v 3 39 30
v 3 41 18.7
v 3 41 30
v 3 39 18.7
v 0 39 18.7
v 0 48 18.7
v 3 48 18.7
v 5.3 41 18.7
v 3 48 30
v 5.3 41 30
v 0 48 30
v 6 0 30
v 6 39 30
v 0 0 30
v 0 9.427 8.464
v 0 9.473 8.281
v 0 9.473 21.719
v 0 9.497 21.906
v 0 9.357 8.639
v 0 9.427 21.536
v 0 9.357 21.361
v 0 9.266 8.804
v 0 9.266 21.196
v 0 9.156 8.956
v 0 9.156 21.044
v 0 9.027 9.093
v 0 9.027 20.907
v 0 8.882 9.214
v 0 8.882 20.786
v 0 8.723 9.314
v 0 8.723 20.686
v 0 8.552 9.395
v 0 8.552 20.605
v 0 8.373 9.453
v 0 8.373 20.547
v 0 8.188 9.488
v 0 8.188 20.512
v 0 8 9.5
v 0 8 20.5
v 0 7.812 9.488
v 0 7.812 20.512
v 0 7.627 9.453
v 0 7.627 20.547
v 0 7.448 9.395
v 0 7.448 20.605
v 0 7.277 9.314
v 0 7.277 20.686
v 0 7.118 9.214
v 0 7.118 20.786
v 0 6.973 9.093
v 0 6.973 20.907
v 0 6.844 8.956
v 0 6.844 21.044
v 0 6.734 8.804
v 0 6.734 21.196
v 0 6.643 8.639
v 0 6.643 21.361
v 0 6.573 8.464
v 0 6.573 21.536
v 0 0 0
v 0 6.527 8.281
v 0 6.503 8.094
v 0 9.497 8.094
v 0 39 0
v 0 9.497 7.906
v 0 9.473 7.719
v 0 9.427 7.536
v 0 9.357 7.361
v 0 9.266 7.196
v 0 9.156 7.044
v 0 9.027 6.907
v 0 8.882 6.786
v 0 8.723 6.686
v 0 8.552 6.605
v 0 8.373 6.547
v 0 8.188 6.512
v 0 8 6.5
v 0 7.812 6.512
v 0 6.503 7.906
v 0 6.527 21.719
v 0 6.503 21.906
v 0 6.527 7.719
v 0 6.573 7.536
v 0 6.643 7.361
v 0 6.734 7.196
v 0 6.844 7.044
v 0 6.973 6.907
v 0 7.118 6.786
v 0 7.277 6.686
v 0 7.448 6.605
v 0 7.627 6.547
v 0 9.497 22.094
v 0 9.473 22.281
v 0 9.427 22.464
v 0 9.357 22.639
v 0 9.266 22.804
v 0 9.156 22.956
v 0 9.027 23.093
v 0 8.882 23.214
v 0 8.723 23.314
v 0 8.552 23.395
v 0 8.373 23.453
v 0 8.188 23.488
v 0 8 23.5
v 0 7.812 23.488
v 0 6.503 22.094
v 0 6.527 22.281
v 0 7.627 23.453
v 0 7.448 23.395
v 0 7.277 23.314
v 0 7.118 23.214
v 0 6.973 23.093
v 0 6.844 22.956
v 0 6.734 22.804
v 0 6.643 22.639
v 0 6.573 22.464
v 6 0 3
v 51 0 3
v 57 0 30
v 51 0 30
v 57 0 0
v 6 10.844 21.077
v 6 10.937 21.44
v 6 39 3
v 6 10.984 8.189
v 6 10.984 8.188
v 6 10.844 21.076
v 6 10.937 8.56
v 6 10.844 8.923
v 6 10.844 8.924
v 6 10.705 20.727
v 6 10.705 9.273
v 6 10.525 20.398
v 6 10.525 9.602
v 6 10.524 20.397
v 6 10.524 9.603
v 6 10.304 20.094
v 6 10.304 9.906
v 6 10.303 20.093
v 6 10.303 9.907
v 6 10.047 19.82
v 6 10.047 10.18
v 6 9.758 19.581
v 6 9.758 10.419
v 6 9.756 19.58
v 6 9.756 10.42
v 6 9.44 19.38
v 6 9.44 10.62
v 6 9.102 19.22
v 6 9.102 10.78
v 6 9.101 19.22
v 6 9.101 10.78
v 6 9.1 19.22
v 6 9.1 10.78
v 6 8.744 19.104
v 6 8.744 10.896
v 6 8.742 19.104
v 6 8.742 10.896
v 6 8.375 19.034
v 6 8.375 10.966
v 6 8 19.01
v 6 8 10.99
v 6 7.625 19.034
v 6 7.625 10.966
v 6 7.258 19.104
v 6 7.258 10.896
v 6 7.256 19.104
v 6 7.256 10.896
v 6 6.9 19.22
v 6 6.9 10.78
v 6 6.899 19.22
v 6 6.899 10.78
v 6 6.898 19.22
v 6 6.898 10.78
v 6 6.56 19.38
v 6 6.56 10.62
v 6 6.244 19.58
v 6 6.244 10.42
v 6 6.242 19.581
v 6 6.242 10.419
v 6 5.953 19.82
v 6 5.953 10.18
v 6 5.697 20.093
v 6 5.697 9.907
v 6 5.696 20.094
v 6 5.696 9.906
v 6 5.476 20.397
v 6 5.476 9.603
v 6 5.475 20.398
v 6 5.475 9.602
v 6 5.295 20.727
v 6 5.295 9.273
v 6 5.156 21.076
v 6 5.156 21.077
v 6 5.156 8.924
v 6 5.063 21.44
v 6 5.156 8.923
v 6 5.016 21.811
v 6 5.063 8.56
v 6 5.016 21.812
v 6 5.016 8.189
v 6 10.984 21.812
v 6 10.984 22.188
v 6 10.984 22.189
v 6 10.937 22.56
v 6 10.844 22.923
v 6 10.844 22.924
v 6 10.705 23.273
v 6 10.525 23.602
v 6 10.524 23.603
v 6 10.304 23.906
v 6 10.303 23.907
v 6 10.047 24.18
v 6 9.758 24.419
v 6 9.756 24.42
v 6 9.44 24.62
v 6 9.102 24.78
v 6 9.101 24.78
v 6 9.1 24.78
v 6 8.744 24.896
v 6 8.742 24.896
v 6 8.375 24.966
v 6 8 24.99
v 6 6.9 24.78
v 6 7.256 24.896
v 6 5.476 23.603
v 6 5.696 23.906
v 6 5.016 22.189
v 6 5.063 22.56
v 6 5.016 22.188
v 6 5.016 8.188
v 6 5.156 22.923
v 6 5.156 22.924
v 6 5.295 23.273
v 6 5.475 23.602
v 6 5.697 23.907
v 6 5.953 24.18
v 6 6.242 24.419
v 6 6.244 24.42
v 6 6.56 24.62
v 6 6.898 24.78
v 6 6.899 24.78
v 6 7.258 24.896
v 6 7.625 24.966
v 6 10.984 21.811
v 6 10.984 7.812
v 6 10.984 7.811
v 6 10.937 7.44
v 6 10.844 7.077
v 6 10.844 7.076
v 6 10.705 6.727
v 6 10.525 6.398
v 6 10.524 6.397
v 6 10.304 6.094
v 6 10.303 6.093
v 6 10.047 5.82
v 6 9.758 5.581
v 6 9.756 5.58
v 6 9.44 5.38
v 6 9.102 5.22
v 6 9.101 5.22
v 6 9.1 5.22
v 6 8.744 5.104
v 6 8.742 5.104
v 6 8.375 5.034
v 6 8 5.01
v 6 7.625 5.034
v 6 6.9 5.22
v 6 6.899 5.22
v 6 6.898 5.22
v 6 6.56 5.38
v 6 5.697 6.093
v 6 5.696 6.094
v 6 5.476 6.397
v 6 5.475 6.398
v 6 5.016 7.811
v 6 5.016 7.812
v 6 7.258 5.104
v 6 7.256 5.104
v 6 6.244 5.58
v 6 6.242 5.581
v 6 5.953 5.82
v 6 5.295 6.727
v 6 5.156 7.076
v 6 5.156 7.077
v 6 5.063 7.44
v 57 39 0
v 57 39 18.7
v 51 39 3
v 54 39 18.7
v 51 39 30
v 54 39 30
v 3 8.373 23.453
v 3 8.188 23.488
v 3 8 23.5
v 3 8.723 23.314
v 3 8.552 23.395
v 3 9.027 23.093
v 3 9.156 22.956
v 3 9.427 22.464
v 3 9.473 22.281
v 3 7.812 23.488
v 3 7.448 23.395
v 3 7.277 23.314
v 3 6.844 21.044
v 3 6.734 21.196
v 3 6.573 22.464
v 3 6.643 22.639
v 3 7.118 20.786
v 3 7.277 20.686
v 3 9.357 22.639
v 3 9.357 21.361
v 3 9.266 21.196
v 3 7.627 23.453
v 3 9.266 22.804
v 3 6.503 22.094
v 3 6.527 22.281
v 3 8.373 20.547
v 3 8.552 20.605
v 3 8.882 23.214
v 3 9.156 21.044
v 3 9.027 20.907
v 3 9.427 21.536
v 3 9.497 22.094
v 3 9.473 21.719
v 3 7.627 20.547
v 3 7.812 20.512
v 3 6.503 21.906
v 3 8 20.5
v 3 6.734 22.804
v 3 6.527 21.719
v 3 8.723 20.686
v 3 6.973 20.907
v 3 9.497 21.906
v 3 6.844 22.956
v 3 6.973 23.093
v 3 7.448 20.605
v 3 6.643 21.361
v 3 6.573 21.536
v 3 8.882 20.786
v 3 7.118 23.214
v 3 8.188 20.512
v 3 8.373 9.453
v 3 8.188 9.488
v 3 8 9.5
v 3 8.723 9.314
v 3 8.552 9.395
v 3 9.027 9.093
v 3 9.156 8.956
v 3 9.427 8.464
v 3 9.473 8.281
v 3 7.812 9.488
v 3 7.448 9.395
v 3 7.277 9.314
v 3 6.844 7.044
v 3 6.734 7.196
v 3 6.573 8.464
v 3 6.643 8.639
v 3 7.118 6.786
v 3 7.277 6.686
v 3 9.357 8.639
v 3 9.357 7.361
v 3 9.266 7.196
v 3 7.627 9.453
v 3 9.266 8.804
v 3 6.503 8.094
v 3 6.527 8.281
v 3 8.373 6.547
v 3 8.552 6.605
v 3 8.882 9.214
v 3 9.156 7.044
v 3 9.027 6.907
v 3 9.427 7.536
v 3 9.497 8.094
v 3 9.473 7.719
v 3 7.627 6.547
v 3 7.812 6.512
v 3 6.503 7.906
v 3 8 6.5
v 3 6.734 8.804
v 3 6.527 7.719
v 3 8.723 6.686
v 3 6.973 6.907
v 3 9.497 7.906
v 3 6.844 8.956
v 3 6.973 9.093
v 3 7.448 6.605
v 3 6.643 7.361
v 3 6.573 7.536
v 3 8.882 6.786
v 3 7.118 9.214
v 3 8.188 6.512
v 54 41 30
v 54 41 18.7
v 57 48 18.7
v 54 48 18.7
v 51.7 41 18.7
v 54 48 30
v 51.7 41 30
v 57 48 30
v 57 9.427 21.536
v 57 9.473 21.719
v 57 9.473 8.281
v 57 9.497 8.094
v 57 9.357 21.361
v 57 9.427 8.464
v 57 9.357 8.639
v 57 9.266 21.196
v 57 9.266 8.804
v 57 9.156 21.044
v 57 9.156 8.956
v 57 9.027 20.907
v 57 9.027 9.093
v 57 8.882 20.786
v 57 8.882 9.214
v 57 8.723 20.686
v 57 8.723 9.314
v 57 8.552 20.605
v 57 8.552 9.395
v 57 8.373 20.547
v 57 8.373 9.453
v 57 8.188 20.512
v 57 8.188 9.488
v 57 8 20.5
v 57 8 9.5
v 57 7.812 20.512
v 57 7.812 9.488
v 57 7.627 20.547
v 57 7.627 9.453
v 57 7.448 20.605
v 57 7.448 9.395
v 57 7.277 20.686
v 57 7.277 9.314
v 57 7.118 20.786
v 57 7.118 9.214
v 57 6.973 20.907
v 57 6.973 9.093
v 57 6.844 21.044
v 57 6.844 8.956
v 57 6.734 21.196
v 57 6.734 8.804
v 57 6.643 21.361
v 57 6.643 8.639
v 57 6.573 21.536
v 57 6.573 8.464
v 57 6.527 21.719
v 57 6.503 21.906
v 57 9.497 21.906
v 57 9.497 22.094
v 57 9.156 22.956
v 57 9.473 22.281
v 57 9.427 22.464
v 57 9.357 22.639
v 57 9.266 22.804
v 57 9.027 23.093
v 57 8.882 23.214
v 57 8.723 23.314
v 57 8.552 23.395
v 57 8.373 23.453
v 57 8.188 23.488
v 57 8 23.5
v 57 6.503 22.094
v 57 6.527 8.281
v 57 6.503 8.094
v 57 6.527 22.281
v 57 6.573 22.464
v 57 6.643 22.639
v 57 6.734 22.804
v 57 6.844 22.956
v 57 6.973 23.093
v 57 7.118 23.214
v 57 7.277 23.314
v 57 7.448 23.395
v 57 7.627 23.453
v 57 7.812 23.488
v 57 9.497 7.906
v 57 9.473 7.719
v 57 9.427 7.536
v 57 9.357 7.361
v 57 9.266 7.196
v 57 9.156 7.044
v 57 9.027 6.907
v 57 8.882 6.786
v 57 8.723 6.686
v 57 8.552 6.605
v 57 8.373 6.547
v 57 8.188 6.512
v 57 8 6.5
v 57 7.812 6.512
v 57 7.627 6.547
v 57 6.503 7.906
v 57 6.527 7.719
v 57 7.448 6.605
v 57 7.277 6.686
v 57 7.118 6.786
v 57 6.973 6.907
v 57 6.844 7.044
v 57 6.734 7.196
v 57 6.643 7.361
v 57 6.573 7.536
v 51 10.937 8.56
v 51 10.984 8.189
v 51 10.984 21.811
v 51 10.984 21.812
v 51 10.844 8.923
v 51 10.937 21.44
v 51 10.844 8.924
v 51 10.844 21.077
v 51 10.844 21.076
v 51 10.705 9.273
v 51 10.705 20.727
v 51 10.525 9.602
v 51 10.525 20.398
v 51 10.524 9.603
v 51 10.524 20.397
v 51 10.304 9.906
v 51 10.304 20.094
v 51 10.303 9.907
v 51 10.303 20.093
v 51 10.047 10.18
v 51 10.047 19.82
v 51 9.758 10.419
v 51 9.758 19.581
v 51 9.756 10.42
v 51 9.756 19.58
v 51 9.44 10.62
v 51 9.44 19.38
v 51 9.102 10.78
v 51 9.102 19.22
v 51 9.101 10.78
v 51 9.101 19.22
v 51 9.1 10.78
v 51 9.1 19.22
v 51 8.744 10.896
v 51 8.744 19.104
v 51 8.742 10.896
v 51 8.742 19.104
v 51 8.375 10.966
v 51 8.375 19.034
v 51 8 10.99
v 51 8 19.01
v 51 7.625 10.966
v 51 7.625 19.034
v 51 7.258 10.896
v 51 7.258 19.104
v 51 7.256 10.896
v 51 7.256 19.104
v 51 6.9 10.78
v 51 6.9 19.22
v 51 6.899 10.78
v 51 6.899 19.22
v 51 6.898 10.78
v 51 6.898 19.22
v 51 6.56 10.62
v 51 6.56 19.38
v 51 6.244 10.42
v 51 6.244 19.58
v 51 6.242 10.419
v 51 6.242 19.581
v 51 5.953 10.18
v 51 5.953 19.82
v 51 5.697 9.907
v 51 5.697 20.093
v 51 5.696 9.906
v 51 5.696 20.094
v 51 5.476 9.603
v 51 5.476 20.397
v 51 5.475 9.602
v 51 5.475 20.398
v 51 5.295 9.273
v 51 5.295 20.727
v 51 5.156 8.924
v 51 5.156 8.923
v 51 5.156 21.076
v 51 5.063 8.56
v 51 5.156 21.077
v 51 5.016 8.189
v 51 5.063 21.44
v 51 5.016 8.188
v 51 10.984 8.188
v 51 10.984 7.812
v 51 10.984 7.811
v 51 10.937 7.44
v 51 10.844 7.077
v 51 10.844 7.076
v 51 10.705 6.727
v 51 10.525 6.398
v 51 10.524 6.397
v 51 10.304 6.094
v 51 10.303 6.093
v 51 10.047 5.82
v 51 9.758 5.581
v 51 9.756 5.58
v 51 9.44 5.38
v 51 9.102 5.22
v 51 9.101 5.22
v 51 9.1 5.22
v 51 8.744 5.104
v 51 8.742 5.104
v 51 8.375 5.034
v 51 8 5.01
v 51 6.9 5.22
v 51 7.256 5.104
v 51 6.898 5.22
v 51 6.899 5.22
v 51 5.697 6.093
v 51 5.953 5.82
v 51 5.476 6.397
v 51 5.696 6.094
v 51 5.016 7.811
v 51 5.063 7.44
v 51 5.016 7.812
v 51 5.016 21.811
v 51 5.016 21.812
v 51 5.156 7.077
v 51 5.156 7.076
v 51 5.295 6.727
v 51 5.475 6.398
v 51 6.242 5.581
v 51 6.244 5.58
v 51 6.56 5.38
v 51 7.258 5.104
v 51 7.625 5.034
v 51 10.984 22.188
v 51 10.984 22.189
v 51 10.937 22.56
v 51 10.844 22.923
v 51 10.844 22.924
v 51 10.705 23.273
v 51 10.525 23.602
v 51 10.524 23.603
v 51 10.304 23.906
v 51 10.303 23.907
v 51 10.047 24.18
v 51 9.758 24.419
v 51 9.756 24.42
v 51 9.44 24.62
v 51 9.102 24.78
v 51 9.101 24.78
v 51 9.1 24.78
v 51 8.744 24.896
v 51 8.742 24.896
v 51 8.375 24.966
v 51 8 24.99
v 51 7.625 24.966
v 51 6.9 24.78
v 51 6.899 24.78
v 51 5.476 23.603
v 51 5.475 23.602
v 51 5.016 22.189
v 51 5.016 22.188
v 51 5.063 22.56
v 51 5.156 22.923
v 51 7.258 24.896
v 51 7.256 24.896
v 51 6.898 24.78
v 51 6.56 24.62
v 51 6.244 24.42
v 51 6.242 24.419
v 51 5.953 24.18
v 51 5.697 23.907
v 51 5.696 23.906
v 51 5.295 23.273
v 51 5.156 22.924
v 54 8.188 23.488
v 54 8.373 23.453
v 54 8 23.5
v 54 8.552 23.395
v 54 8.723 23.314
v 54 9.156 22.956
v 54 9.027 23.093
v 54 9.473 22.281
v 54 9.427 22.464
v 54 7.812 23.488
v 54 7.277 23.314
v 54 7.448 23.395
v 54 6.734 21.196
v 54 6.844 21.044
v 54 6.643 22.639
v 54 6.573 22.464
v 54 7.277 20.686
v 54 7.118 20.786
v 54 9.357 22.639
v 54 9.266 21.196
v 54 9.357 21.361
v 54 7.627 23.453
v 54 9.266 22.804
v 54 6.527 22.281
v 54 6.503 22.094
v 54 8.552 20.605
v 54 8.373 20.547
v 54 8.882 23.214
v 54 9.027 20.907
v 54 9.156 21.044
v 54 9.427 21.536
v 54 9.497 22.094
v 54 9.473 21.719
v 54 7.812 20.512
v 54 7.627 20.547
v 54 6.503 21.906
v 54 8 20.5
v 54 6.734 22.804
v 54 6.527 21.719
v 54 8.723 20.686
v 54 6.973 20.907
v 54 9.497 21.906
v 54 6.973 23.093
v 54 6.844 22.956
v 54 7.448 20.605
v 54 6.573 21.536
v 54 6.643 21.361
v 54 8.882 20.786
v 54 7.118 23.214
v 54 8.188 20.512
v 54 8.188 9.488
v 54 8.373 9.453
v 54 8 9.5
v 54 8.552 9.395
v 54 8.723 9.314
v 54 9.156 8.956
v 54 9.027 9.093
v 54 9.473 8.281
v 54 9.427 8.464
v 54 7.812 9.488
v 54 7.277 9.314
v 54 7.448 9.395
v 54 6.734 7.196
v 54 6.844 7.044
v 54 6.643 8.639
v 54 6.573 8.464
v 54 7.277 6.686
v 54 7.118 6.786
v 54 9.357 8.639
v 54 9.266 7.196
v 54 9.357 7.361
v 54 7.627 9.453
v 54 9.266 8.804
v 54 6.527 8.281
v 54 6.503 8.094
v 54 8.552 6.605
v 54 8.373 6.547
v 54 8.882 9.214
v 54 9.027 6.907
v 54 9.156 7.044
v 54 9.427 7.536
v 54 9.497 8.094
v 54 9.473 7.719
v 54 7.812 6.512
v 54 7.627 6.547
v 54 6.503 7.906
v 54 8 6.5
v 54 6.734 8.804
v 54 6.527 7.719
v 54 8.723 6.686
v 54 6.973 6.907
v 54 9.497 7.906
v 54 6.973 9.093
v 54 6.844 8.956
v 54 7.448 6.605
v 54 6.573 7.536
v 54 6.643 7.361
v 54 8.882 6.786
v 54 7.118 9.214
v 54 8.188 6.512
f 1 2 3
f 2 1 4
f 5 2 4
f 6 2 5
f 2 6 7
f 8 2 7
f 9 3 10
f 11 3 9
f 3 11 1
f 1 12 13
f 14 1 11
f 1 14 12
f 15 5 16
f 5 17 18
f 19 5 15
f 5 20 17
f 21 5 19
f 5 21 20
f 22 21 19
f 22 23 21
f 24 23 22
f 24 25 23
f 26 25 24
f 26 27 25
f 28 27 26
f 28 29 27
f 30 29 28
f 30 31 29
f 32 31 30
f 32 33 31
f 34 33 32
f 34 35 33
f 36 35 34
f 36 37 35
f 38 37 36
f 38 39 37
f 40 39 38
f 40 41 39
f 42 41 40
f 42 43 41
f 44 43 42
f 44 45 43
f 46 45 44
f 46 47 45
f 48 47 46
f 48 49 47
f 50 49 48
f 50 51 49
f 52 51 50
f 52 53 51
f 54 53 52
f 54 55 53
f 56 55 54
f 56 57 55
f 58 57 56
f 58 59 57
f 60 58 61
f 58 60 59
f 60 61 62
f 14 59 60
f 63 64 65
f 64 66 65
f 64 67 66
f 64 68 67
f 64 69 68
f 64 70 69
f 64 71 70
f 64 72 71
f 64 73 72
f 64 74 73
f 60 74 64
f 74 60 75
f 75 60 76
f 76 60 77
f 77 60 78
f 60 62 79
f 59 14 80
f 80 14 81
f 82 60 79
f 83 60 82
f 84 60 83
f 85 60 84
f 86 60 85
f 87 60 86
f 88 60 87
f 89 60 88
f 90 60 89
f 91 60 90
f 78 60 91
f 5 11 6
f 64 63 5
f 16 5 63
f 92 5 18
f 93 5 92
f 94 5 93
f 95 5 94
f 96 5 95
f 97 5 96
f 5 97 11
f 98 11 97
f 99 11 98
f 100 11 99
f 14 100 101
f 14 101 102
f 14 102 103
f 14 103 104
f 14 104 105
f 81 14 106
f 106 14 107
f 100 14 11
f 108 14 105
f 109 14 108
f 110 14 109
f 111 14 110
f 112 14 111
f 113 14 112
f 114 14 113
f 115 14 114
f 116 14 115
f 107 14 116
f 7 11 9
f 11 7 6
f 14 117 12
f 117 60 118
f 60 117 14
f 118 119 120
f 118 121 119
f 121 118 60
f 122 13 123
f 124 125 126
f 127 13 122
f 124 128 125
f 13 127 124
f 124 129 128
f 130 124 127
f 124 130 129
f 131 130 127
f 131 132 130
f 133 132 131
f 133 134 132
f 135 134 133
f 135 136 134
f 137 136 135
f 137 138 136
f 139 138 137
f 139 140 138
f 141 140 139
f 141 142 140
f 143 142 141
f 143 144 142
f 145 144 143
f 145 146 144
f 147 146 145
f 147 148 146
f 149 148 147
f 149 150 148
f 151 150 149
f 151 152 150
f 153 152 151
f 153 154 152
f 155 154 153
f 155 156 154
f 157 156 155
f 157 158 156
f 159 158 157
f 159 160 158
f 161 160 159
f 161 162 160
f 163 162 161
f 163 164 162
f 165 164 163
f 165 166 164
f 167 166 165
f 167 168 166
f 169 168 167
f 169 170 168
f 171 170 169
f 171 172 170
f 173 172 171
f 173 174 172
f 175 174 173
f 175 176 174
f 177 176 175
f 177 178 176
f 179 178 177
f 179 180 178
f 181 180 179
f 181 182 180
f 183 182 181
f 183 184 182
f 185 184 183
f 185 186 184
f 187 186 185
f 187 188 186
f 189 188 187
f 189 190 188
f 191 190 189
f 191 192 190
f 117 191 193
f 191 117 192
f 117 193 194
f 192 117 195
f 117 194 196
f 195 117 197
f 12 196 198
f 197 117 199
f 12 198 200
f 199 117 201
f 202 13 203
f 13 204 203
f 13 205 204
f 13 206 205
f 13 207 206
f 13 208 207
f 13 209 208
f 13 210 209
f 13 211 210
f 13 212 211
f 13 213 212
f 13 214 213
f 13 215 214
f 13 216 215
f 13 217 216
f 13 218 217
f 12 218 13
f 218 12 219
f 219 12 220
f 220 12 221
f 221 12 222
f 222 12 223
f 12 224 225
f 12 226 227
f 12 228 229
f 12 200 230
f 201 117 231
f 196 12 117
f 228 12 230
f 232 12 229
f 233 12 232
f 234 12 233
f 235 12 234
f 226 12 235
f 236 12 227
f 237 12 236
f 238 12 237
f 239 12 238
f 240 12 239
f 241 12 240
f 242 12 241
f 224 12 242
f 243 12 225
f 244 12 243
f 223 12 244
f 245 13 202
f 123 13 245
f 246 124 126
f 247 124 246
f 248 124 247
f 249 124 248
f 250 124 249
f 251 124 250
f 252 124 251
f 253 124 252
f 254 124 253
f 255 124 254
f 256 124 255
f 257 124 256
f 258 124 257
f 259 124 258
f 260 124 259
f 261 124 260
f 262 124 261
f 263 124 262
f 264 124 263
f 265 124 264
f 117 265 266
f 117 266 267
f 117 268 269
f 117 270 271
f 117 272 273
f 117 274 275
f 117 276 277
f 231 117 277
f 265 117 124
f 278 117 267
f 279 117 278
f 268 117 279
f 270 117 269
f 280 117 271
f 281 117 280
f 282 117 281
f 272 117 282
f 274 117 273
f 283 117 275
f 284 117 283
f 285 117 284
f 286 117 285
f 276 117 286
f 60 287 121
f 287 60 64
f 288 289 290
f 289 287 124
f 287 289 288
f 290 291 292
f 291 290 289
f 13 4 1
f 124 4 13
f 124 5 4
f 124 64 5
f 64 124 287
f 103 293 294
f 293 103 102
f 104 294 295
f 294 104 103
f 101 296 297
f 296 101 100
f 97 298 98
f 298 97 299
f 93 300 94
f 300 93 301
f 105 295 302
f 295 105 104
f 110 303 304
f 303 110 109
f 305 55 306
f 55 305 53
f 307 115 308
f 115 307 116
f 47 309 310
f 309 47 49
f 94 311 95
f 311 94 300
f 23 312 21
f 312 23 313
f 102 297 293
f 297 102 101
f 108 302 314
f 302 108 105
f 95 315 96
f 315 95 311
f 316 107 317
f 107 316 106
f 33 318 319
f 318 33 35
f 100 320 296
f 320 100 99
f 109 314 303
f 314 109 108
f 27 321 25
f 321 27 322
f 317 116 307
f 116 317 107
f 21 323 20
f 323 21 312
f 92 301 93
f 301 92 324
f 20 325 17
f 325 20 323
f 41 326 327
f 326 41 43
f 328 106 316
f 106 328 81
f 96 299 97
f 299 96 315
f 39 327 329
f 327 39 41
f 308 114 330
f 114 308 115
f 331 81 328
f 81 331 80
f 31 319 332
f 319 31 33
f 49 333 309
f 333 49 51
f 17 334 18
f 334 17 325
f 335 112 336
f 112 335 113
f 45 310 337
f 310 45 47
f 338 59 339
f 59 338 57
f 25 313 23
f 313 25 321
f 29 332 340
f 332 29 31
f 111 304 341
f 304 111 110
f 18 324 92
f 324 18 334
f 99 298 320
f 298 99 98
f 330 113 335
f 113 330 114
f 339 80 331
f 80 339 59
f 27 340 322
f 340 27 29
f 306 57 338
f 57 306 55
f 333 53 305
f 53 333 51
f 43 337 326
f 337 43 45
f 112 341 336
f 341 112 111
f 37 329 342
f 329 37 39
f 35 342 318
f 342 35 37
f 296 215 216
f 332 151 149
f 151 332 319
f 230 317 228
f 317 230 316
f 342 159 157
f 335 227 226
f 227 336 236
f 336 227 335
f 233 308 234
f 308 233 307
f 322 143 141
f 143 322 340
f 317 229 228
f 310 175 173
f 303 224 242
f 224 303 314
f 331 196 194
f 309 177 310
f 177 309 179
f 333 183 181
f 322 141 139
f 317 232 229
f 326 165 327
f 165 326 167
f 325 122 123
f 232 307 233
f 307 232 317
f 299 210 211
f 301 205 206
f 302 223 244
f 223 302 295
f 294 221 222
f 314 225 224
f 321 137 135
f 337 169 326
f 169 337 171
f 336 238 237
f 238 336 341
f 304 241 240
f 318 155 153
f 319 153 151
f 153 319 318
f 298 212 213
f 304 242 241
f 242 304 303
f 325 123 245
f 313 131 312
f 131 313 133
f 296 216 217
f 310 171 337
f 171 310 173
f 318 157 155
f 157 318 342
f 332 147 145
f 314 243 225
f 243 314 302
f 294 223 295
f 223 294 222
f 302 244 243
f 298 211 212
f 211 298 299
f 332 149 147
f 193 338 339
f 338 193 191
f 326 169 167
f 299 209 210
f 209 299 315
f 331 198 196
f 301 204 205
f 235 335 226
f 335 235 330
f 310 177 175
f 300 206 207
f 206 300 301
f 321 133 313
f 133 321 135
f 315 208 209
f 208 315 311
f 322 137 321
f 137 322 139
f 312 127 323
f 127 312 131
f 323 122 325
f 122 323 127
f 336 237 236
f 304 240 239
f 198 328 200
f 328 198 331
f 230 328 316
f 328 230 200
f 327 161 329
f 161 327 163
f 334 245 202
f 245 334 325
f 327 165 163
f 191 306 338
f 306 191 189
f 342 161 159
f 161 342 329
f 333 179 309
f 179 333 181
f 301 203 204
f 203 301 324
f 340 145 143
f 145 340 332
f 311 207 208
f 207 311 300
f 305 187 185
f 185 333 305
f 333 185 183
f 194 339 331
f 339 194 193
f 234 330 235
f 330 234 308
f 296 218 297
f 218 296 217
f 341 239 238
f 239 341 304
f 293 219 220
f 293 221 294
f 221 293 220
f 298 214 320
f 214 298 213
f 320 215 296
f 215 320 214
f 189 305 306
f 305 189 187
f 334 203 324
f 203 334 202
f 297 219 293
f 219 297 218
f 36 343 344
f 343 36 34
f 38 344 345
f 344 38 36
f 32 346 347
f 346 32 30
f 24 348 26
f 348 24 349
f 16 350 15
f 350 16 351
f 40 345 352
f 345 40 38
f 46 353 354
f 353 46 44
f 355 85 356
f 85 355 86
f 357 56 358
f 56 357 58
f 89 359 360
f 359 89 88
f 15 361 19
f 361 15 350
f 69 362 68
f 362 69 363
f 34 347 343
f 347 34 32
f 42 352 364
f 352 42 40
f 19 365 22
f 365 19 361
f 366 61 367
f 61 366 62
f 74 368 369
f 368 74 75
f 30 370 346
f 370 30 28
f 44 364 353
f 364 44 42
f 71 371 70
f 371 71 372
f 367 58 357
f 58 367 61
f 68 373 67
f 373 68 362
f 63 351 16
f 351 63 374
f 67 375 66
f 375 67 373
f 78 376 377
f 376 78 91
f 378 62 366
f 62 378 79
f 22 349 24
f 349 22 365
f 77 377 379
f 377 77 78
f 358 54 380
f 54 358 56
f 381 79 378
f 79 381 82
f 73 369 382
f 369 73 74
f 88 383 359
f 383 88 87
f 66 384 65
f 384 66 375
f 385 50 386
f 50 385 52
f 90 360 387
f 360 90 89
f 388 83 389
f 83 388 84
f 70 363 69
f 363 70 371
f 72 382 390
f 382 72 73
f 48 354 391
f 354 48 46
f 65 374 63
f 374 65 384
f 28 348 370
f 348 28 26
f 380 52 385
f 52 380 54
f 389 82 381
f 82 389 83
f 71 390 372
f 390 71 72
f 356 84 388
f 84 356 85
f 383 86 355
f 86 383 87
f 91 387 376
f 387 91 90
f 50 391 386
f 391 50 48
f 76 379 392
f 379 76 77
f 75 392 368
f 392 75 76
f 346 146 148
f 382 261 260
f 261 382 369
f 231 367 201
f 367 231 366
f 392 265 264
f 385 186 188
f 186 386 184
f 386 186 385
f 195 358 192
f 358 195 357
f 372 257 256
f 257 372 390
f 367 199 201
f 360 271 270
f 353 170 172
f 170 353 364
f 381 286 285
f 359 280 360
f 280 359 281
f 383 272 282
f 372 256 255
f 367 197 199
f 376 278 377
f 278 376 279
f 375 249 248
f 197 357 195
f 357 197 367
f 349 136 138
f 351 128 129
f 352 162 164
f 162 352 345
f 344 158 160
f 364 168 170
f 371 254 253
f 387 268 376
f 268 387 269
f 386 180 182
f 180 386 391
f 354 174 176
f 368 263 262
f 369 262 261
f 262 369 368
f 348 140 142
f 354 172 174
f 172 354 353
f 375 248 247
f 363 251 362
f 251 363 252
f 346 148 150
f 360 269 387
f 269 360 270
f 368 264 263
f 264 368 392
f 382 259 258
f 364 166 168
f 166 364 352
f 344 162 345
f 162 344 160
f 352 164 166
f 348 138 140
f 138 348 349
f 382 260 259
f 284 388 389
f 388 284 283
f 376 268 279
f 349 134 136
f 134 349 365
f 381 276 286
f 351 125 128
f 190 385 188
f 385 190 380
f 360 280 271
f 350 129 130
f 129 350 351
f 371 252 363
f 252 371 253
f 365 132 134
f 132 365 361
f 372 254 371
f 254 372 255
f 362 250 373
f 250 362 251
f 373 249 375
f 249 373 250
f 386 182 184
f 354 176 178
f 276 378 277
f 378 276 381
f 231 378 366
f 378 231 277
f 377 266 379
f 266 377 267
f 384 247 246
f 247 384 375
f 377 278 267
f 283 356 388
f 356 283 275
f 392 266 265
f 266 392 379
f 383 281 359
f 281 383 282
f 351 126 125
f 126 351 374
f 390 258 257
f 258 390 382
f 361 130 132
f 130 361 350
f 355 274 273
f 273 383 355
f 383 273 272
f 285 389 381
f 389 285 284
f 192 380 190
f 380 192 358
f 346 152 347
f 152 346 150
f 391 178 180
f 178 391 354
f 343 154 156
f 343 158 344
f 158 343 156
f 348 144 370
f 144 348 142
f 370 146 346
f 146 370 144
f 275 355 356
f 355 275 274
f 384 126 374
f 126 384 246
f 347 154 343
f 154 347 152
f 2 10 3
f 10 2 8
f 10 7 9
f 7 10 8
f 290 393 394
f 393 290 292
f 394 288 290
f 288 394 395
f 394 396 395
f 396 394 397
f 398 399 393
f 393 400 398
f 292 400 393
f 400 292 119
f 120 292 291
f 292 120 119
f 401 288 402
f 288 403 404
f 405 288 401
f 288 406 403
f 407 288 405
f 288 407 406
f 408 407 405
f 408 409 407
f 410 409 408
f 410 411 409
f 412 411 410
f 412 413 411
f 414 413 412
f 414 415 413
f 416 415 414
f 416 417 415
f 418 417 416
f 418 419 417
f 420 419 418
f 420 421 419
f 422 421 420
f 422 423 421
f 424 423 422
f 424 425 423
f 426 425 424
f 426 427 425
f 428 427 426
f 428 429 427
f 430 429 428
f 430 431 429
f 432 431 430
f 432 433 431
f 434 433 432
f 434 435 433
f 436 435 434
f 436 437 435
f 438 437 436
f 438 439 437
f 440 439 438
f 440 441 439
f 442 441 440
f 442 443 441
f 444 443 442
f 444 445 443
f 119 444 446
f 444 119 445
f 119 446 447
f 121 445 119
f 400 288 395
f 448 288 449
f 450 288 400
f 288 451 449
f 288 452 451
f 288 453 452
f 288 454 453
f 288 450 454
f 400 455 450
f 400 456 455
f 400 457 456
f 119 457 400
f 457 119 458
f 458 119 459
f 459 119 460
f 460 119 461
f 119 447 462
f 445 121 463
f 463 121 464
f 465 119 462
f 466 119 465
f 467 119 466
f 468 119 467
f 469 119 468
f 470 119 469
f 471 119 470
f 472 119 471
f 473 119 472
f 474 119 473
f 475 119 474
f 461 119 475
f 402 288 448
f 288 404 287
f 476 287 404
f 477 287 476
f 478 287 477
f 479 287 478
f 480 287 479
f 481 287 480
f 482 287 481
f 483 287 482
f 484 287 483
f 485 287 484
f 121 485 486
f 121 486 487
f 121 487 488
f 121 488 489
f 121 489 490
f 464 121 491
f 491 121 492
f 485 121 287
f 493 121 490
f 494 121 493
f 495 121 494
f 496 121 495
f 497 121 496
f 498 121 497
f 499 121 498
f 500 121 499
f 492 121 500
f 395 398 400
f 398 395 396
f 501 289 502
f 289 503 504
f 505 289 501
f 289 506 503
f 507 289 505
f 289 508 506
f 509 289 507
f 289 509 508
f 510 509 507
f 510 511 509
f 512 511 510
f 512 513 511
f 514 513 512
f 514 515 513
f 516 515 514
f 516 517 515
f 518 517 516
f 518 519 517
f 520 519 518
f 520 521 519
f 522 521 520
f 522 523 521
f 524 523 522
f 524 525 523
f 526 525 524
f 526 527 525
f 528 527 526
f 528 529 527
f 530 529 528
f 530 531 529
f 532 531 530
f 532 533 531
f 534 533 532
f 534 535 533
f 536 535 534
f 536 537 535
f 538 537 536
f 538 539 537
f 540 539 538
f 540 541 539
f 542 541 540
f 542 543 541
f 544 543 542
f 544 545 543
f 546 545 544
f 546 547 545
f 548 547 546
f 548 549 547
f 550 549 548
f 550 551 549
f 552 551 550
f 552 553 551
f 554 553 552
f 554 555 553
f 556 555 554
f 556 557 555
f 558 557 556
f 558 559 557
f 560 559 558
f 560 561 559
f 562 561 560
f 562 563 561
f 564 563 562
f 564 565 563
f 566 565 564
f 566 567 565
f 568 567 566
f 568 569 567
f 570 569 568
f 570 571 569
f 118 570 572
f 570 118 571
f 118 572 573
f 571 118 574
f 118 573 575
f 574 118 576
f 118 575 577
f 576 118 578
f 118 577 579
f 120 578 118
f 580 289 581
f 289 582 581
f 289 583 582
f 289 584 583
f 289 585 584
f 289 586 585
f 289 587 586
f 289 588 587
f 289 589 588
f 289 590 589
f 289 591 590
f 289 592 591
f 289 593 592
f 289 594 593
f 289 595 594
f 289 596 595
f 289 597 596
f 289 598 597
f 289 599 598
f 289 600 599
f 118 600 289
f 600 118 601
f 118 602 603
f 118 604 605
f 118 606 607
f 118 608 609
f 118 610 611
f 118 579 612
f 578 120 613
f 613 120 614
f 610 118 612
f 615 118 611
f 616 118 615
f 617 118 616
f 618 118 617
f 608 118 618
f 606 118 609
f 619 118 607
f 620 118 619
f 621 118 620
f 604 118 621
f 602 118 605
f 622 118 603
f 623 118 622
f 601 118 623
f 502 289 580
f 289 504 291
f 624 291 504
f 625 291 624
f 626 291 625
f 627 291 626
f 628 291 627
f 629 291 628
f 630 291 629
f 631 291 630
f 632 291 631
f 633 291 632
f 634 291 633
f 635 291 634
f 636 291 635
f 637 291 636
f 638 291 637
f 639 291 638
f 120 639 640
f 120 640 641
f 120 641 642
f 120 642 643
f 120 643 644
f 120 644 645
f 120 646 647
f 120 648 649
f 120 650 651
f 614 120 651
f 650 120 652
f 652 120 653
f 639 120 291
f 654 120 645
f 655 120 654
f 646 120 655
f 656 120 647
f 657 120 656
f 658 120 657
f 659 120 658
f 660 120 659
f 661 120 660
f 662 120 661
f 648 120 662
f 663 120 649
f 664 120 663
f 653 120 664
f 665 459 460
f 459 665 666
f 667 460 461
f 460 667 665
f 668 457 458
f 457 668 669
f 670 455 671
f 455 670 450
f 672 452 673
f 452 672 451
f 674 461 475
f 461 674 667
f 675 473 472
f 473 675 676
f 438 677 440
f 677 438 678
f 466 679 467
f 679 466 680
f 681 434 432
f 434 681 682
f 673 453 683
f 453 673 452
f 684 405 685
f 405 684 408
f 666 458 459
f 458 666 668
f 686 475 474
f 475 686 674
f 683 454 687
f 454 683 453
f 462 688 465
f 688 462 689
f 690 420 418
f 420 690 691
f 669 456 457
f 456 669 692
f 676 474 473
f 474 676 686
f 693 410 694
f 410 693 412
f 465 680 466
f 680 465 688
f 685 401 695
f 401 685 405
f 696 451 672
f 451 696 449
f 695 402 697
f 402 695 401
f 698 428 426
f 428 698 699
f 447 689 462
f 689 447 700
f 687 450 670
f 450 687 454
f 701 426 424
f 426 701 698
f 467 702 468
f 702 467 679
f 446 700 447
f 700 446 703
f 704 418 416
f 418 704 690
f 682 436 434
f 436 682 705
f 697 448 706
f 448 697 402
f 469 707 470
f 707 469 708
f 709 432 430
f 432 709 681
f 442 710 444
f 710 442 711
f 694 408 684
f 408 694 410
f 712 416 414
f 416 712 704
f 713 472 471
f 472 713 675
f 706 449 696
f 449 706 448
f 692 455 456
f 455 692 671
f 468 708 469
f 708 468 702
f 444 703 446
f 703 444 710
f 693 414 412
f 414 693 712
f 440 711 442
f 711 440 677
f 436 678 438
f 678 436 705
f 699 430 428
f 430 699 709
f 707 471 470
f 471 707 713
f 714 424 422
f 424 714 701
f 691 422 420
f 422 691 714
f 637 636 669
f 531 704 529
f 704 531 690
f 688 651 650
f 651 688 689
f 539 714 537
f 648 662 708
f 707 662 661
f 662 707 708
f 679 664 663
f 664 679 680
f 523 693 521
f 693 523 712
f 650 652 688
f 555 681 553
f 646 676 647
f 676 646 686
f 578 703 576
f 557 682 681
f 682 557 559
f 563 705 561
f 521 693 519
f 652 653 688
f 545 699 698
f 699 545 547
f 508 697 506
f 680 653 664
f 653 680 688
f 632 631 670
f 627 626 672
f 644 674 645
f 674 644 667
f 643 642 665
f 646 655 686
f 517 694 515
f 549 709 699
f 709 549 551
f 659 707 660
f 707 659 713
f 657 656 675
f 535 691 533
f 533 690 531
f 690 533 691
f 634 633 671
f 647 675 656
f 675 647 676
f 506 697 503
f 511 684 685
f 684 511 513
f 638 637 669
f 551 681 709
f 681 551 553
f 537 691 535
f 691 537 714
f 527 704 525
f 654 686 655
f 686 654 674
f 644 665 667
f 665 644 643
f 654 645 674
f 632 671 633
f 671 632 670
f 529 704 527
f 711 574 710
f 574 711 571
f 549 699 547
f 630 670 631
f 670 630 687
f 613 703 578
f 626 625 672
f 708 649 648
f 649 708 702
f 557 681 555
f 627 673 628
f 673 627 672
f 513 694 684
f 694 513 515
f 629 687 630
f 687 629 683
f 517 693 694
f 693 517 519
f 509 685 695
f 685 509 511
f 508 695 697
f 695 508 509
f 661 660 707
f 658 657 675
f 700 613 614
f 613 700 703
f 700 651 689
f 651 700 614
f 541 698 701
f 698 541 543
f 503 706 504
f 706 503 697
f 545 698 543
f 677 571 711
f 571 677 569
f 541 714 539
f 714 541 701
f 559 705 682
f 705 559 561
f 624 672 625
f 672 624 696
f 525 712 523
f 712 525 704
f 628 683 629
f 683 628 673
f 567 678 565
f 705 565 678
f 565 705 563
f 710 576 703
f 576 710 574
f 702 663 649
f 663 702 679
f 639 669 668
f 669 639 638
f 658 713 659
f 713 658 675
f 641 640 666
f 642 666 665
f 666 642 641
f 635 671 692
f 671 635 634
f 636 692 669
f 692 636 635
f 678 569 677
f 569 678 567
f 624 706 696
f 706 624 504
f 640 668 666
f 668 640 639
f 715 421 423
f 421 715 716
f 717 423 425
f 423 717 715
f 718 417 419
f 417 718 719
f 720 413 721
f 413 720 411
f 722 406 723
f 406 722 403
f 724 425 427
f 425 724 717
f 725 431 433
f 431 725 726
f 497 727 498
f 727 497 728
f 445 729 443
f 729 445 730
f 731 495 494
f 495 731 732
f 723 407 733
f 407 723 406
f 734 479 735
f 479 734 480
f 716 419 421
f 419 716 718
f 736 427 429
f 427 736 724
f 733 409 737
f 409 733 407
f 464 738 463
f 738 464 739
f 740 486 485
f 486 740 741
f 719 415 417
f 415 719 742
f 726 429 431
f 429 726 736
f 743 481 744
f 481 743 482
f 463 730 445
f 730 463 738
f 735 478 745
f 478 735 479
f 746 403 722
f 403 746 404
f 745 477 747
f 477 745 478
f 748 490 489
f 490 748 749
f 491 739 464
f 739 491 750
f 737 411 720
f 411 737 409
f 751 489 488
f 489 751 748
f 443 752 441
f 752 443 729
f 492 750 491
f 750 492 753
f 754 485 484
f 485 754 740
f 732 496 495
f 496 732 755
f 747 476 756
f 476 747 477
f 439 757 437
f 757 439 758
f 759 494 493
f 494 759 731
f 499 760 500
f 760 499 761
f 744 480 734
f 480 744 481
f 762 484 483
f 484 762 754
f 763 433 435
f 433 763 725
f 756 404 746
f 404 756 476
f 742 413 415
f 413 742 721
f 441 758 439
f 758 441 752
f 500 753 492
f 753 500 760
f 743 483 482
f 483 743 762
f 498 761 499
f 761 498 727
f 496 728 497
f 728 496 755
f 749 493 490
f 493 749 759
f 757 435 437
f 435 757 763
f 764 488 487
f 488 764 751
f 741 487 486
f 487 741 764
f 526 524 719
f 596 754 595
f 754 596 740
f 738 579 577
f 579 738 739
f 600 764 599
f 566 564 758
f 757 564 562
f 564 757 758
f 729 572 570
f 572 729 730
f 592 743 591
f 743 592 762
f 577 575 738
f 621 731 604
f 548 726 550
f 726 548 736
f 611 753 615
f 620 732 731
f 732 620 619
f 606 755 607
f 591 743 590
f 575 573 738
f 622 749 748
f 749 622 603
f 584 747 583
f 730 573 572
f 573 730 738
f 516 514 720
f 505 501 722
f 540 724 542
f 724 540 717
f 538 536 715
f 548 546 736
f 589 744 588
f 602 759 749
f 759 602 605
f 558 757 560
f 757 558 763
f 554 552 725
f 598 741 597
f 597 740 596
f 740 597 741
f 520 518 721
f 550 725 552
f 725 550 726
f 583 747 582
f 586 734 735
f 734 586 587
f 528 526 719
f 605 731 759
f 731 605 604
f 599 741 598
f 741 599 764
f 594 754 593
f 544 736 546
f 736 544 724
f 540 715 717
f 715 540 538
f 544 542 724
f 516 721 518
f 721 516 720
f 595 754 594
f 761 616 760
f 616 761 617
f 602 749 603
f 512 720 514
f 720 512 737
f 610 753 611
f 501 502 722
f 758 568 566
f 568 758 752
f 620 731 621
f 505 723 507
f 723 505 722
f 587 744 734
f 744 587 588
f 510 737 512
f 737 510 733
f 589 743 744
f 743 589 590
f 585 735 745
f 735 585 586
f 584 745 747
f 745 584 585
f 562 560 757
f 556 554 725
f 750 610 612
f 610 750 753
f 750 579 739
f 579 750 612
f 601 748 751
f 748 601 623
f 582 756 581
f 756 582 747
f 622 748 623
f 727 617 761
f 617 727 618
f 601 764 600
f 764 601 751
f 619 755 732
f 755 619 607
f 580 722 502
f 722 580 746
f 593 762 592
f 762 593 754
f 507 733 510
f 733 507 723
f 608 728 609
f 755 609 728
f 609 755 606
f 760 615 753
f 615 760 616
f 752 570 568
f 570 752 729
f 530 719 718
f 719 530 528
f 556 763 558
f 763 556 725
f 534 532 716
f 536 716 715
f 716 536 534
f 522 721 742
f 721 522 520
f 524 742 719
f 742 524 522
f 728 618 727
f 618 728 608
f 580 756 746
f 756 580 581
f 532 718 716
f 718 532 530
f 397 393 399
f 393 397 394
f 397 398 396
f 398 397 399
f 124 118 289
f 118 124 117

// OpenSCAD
length = 11.3;
width = 3;
height = 48;
latch_width = 2.3;
latch_height = 7;
slot_width = 2;
support_length = 30;
back_height = 30;
end_width = 57;
screw_shaft = 3;

$fn=50;

module countersunk_head(shaft_width, height) {
    union() {
        if (height>shaft_width) translate([0, 0, -0.01])
          cylinder(h=(height+0.02-shaft_width), d=shaft_width);
        translate([0, 0, (height-shaft_width)]) 
          cylinder(h=screw_shaft+0.02, d1=shaft_width, d2=shaft_width*2);
    }
}

module latch(
  length, width, height, latch_width, latch_height, slot_width, 
  support_length, back_height
) {
    // this is on its side, so the width goes into +X,
    // height goes into +Y, and length goes into +Z
    support_height=back_height-length;
    difference() {
        union () {
            // the length of the latch
            cube([width, height, length]);
            // the support that attaches to the bridge between the two latches
            cube([width*2, height-(latch_height+slot_width), back_height]);
        };
        // countersunk screw holes
        translate([0, 8, 8]) rotate([0, 90, 0])
          countersunk_head(screw_shaft, width*2);
        translate([0, 8, back_height-8]) rotate([0, 90, 0])
          countersunk_head(screw_shaft, width*2);
    };
    // the angled latch
    translate([0, height-latch_height, 0]) difference() {
        cube([width+latch_width, latch_height, length]);
        translate([width+latch_width, 0, -0.01])
         rotate([0, 0, atan2(latch_width, latch_height)]) 
         cube([latch_width, sqrt(pow(latch_width,2) + pow(latch_height,2)), length+0.02]);
    };
}


translate([0, 0, back_height]) mirror([0, 0, 1]) union() {
    latch(length, width, height, latch_width, latch_height, slot_width, 
      support_length, back_height);
    translate([end_width, 0, 0]) mirror([1, 0, 0]) latch(
      length, width, height, latch_width, latch_height, slot_width, 
      support_length, back_height);
    translate([0, 0, back_height-width])
      cube([end_width, (height-(latch_height+slot_width)), width]);
};
